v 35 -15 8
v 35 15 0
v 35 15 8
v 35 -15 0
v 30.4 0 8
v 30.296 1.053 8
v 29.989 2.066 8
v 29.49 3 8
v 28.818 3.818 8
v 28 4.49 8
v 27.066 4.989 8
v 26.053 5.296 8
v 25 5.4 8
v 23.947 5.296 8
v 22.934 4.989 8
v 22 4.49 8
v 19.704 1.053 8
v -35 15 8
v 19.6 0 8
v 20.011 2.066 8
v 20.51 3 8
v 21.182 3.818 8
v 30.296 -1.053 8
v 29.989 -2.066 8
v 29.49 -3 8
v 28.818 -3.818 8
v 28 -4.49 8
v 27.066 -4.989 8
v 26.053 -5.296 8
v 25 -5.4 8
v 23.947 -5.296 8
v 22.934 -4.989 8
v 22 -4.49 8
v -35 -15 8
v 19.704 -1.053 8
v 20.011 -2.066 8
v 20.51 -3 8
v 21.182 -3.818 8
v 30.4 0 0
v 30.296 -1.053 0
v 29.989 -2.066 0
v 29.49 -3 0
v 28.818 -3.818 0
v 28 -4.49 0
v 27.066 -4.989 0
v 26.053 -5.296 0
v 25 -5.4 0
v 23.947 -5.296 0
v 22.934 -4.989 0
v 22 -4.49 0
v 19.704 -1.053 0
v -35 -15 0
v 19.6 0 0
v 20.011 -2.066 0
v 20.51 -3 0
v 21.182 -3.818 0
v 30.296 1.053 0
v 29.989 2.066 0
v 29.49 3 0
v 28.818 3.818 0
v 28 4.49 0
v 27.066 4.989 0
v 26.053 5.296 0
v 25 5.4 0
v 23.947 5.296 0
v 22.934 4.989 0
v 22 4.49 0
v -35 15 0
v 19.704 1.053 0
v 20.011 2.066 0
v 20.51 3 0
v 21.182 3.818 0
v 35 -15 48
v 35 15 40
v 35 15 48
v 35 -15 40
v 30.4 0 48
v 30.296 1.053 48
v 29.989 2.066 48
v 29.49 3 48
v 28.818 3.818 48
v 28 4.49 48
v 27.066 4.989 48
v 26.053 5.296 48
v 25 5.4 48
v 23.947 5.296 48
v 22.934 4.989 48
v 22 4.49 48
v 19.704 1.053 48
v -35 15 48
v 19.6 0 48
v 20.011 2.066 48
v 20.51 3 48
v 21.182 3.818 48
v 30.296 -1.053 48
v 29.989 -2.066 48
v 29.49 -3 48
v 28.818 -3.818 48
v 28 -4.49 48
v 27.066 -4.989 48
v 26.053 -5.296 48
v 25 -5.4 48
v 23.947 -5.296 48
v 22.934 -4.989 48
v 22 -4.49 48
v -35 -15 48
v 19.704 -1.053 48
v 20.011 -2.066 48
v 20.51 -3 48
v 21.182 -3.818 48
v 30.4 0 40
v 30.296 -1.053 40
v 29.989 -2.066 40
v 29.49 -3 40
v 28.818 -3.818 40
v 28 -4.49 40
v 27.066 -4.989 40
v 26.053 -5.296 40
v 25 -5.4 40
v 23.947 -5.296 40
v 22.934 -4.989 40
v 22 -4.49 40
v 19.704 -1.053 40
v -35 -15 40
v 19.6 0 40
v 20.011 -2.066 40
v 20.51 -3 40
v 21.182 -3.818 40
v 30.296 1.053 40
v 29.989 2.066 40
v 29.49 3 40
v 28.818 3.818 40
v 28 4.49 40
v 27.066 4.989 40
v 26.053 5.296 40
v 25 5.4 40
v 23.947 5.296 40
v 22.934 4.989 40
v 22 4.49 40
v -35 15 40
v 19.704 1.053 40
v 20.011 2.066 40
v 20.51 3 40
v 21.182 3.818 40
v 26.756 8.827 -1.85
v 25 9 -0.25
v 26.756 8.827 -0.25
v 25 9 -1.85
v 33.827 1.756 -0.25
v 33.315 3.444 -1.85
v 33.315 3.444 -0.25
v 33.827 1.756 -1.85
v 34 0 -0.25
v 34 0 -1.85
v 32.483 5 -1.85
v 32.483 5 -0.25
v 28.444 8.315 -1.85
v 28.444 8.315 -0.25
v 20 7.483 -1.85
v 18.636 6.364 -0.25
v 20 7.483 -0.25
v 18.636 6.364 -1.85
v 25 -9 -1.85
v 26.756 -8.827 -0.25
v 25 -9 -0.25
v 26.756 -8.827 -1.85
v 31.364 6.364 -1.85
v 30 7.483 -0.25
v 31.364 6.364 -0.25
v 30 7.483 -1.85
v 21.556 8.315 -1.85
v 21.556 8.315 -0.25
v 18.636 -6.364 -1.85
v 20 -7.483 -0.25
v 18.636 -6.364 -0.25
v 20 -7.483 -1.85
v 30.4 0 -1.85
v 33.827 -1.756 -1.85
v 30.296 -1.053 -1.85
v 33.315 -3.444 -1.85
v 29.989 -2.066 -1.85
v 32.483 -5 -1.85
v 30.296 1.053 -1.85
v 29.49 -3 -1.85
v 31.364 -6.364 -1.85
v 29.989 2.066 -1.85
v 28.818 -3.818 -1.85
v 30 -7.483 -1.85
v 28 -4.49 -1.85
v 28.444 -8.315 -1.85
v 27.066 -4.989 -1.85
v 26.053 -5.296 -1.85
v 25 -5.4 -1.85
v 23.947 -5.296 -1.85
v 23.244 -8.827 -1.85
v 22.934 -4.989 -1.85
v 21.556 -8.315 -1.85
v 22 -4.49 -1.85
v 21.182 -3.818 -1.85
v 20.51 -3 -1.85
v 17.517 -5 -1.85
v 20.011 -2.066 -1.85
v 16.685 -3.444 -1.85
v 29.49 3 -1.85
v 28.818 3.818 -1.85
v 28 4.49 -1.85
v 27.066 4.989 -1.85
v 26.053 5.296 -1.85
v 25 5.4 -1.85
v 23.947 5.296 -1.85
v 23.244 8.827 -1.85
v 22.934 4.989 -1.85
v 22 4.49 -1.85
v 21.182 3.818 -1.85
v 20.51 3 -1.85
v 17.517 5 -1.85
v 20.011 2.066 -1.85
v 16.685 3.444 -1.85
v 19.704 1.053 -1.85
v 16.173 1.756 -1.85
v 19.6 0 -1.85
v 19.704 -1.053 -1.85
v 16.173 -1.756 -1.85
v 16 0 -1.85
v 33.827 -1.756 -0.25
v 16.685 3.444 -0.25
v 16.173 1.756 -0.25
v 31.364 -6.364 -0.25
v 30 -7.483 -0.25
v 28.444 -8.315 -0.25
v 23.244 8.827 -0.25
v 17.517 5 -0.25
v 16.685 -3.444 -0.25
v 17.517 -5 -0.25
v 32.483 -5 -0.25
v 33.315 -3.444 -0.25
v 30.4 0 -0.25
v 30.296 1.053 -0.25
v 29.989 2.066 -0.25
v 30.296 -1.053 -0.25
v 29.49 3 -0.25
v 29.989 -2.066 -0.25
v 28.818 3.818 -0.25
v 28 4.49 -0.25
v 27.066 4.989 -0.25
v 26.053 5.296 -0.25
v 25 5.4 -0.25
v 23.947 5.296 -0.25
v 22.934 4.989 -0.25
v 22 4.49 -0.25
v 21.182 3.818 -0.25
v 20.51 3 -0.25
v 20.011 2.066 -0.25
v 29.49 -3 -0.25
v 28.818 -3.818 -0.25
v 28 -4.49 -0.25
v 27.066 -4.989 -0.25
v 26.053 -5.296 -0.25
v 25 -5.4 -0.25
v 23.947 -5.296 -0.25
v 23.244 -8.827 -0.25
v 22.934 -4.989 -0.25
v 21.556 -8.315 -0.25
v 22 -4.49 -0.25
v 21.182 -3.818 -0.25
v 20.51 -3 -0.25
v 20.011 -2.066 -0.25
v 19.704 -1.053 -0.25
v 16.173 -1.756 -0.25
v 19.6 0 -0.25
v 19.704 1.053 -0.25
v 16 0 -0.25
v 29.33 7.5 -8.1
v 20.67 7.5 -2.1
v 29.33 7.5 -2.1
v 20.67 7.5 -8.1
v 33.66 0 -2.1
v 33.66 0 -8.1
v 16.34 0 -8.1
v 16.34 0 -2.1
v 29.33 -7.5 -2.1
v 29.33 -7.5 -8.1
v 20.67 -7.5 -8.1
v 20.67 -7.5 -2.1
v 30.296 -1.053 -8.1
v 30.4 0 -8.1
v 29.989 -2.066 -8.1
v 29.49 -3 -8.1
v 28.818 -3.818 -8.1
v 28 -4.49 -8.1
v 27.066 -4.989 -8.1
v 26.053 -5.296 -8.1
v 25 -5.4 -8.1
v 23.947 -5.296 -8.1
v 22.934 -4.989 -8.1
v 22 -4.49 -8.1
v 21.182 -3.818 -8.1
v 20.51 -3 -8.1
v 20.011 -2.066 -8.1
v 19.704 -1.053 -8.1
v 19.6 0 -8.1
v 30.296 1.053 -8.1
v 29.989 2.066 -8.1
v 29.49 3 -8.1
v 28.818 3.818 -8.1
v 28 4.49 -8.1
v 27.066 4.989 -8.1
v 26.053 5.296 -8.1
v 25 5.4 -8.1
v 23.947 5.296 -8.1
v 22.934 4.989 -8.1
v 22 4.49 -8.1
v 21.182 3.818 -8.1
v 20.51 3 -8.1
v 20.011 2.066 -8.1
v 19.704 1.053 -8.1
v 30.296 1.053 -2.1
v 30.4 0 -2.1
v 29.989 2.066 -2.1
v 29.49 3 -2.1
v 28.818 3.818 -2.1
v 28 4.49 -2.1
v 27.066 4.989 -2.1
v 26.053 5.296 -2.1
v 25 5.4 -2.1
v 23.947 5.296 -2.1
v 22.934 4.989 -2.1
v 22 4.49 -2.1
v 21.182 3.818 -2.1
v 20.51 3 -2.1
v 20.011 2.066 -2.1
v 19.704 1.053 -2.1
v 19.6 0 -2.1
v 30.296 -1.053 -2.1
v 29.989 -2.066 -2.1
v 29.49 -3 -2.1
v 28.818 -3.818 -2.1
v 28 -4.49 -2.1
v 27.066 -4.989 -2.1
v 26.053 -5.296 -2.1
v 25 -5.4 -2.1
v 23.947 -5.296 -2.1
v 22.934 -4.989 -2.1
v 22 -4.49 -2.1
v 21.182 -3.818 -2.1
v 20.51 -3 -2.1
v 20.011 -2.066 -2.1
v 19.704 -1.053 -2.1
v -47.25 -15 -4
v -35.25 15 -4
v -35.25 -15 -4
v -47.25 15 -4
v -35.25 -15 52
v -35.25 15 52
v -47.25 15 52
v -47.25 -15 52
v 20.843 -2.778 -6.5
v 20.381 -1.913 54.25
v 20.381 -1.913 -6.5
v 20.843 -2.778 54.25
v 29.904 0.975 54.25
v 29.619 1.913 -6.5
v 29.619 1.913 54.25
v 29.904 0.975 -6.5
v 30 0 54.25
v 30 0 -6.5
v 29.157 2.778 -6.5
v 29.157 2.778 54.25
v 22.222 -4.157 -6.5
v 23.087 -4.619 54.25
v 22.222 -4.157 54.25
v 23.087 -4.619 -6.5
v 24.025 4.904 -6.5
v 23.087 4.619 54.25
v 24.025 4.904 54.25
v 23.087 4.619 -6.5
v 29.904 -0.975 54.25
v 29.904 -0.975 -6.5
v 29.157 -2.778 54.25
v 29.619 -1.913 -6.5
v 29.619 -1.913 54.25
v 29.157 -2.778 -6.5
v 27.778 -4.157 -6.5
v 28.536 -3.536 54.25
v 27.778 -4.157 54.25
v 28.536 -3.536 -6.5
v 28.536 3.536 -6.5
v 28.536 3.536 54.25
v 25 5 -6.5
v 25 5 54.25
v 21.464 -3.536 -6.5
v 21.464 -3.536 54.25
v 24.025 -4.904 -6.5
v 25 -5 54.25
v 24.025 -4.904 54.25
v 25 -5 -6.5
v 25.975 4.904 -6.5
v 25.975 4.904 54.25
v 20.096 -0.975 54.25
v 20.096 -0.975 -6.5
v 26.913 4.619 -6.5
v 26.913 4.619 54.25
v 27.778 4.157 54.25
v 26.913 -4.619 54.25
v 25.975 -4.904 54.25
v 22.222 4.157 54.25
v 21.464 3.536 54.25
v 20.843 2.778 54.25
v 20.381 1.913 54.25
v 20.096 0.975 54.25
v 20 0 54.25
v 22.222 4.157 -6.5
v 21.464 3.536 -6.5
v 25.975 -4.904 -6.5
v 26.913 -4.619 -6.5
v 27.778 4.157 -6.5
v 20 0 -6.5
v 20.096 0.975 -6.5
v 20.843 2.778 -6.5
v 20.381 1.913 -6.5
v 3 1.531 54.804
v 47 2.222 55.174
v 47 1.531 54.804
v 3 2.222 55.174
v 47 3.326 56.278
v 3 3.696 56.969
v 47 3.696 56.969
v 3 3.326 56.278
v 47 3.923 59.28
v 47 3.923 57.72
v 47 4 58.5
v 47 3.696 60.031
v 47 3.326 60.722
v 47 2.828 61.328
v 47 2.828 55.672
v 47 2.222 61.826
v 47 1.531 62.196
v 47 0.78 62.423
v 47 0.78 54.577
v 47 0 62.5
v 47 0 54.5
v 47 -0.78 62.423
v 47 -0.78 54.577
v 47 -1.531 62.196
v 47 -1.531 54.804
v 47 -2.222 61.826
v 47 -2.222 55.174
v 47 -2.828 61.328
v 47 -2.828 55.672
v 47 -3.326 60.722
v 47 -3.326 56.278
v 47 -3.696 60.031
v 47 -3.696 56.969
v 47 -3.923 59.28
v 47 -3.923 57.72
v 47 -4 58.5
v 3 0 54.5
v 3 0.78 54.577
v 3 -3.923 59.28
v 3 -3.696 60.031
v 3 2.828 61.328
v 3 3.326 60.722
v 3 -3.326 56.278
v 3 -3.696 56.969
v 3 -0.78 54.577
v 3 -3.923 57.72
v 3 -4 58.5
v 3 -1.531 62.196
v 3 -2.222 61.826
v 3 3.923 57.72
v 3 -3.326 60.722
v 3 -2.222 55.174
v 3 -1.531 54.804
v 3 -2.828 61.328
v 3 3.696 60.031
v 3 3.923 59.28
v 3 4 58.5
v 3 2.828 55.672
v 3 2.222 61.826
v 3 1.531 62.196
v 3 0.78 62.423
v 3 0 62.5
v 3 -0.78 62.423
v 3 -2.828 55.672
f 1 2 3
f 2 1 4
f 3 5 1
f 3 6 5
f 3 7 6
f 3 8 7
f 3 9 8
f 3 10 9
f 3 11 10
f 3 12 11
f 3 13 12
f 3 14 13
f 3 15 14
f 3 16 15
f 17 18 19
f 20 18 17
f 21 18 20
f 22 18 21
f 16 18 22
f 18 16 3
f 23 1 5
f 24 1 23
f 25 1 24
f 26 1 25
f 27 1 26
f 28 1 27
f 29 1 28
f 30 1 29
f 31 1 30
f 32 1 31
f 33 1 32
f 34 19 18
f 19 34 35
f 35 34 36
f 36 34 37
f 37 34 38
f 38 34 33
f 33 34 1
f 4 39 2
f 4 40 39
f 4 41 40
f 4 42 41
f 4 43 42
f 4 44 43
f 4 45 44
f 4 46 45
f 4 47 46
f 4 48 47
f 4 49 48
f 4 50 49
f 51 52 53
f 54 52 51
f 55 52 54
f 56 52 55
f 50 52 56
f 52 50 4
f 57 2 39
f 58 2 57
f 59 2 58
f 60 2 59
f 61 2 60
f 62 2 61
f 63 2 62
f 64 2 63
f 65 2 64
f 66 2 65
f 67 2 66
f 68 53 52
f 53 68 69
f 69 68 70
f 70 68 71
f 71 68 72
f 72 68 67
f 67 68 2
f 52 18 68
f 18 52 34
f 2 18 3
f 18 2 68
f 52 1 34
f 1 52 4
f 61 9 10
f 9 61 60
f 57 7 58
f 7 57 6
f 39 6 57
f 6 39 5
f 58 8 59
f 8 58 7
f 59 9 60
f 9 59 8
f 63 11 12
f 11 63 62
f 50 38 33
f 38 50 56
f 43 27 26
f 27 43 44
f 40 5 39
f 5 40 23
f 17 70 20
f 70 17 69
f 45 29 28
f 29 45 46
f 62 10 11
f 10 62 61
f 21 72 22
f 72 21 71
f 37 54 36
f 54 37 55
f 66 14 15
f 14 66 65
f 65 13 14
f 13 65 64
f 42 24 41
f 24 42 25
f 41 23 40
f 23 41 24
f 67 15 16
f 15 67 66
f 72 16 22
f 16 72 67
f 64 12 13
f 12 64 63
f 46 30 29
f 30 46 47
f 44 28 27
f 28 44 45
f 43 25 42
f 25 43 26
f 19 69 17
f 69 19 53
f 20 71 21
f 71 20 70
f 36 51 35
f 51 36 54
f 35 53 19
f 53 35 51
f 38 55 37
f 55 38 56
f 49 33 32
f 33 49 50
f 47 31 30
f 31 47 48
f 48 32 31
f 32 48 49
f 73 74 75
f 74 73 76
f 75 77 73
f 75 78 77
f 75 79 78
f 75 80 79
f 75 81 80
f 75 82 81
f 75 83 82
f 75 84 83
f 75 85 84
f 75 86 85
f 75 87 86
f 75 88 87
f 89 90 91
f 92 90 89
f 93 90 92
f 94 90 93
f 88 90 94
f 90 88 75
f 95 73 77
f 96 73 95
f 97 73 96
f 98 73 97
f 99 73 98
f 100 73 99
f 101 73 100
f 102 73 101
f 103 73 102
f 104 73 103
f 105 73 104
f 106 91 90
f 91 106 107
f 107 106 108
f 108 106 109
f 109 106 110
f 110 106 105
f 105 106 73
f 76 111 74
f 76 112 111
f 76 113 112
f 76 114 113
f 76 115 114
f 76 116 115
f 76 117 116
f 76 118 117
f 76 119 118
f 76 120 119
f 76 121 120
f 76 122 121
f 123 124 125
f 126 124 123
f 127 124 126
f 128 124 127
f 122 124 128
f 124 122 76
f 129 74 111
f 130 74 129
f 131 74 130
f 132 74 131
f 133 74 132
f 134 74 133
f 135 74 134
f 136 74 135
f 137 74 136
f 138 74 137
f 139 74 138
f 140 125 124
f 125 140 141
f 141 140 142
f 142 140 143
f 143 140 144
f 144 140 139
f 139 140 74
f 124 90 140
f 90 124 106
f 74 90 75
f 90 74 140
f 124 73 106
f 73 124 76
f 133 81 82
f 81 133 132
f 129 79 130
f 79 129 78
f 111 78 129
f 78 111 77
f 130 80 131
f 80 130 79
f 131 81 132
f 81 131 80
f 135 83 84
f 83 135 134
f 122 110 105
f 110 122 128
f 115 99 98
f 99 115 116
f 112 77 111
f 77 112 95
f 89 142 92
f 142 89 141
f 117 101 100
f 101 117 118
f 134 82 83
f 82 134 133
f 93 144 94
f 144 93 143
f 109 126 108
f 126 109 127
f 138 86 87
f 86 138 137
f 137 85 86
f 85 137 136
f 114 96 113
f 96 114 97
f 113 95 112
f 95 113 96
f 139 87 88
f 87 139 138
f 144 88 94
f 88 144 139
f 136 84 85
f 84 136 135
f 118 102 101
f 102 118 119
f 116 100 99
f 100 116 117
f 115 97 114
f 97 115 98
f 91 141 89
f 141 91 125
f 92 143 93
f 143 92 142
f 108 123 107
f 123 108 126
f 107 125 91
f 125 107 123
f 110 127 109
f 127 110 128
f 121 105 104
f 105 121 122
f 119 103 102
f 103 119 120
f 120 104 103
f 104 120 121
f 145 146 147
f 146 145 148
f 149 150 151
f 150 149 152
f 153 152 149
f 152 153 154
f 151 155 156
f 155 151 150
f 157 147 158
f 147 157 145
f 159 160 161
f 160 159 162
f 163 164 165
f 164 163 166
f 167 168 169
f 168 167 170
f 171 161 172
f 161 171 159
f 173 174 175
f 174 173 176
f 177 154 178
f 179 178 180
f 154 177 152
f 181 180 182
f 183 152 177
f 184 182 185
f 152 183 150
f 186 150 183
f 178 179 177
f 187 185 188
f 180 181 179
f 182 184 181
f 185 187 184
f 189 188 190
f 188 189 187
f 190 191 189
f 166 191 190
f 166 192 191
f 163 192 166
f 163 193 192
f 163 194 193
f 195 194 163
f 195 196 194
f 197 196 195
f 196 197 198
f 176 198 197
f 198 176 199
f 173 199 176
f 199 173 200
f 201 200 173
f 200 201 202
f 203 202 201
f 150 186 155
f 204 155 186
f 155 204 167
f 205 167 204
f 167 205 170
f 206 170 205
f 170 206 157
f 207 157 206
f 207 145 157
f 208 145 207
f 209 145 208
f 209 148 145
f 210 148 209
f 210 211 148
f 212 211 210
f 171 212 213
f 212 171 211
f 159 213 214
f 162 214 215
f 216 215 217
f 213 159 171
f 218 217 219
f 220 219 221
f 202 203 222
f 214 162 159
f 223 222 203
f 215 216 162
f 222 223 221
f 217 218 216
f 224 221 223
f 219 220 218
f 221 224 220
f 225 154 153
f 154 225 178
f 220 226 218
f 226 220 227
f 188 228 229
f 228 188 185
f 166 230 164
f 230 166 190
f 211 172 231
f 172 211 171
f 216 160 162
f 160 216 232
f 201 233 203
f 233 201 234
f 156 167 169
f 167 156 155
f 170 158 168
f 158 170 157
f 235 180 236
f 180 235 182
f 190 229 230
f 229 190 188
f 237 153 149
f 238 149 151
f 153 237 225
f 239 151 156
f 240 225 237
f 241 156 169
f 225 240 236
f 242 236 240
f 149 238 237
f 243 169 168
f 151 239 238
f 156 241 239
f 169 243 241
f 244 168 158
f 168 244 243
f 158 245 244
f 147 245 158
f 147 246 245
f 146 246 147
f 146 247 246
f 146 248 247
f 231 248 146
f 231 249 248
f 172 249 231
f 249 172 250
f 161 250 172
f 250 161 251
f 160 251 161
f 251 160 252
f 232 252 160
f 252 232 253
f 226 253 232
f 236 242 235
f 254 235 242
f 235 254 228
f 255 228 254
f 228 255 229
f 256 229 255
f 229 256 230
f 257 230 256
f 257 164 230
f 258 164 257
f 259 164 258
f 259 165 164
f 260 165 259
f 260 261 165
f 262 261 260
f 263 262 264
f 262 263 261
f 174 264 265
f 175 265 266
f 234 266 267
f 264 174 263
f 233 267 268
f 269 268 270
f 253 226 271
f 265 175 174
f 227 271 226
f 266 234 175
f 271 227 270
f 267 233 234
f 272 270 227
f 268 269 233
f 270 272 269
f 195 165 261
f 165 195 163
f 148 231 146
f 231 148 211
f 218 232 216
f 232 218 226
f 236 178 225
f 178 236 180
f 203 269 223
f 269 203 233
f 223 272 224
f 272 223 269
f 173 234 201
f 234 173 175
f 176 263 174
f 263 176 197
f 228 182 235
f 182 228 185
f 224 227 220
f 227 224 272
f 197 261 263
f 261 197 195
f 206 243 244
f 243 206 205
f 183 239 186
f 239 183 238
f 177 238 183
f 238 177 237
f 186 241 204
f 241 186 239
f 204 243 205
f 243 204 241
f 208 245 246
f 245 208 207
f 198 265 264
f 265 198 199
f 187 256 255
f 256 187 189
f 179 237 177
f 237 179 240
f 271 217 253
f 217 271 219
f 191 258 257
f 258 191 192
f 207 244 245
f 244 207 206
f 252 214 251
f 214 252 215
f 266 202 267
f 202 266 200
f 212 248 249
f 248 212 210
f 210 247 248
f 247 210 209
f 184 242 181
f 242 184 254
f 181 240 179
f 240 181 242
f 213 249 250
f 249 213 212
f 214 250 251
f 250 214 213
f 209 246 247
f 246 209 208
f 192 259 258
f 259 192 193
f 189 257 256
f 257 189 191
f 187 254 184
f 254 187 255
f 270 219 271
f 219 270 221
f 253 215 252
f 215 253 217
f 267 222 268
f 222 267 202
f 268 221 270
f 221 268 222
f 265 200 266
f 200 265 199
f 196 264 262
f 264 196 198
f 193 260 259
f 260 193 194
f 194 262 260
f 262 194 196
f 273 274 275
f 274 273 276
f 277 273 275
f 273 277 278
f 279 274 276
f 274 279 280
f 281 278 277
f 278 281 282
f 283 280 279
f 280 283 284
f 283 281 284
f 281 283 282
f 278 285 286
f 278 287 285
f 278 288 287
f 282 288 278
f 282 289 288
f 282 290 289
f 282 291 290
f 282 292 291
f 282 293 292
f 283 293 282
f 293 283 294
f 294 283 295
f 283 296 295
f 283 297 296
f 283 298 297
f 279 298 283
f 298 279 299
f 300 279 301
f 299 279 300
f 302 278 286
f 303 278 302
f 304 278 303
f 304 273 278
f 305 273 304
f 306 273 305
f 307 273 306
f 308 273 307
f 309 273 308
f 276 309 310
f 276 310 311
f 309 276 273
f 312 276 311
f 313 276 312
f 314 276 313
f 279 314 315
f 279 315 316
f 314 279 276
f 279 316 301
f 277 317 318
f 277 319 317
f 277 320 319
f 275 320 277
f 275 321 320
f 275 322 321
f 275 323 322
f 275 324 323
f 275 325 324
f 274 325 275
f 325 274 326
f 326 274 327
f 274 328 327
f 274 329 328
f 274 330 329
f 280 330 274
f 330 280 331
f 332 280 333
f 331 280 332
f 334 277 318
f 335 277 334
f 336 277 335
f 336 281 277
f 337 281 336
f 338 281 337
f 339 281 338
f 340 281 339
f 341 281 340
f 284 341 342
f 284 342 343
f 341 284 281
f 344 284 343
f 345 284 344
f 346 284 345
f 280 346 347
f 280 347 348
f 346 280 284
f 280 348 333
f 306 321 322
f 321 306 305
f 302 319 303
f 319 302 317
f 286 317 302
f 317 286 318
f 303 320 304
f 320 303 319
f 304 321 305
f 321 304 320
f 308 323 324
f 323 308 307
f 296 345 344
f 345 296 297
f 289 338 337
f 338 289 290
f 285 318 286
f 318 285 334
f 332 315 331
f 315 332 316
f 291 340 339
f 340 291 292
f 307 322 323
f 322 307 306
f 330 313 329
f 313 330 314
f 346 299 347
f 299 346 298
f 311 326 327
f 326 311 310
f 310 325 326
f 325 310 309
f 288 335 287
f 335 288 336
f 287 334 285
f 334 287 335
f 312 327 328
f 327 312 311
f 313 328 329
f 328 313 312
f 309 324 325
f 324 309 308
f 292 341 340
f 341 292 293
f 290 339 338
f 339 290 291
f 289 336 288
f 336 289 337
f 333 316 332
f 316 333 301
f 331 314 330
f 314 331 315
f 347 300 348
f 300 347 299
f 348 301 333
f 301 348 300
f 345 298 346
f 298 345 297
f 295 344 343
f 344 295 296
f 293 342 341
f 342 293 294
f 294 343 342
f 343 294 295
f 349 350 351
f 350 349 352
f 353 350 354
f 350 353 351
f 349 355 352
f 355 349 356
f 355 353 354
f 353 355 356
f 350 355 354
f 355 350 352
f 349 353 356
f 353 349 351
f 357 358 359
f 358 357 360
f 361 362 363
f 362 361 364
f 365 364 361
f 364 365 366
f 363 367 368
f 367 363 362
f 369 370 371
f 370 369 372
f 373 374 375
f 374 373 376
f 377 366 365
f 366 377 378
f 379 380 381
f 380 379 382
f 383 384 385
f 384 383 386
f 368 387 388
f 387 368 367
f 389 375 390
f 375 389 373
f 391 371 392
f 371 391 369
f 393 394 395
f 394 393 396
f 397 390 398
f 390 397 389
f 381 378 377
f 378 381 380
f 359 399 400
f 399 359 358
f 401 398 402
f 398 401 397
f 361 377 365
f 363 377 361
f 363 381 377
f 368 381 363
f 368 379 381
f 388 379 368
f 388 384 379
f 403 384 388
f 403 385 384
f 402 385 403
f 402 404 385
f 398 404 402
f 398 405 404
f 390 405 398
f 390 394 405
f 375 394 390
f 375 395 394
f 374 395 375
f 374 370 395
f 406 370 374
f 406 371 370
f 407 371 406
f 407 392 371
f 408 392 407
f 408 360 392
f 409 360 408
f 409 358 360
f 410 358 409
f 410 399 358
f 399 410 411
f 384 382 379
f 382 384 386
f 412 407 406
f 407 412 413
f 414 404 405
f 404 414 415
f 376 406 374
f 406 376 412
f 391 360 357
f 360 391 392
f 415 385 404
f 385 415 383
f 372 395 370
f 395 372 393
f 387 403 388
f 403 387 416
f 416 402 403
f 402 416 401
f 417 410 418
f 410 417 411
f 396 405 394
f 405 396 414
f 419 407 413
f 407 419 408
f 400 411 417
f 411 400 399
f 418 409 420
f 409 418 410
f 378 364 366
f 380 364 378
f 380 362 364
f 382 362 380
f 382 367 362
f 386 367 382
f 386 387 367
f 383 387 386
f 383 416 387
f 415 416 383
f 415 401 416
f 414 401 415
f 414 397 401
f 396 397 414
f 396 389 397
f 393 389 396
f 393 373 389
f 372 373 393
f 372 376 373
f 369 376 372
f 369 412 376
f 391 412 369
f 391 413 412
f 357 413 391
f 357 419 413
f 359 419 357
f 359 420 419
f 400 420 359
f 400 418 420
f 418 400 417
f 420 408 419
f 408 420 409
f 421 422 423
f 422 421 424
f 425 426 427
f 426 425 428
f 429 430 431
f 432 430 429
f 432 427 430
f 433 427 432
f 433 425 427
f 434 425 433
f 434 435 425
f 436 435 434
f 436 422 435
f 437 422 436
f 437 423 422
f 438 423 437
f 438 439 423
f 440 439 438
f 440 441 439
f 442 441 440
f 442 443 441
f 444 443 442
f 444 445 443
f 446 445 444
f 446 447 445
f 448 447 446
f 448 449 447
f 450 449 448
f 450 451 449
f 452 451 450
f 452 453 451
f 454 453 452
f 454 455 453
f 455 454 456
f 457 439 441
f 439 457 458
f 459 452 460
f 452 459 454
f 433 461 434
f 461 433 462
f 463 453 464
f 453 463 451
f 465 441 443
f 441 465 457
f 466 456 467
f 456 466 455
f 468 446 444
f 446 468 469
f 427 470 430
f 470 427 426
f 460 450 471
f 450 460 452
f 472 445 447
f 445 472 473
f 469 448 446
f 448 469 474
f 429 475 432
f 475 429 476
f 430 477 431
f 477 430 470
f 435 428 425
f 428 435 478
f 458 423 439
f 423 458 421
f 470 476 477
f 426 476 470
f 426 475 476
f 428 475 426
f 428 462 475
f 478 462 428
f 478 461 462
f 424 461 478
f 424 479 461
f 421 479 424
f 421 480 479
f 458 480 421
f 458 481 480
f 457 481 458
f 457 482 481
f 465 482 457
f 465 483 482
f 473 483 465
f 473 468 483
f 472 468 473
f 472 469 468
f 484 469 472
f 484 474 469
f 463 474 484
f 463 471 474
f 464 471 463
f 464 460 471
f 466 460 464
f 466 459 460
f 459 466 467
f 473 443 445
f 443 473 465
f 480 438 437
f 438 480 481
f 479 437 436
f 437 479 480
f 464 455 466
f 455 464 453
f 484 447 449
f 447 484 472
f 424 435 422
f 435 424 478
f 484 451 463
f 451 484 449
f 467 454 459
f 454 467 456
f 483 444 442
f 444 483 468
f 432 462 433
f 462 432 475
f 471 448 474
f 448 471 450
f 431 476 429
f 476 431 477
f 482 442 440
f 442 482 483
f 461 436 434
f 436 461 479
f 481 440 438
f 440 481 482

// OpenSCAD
$fn = 32;

// ------------------------------------------------------------------------
// C clamp: throat 40 mm, screw d10
// Every part is its own module, assembly() places every instance.
// ------------------------------------------------------------------------

// --- part 1 ---
module clamp_arm() {
  difference() {
    translate([-35, -15, 0]) cube([70, 30, 8]);
    translate([25, 0, -1]) cylinder(h = 10, d = 10.8);
  }
}

// --- part 2 ---
module clamp_spine() {
  difference() {
    translate([-28, -15, 0]) cube([56, 30, 12]);
  }
}

// --- part 3 ---
module clamp_screw() {
  translate([0, 0, -30.375]) cylinder(h = 60.75, d = 10);
}

// --- part 4 ---
module clamp_washer() {
  difference() {
      translate([0, 0, 0]) cylinder(h = 1.6, d = 18);
      translate([0, 0, -1]) cylinder(h = 3.6, d = 10.8);
    }
}

// --- part 5 ---
module clamp_nut() {
  difference() {
    linear_extrude(height = 6) polygon(points = [[8.66, 0], [4.33, 7.5], [-4.33, 7.5], [-8.66, 0], [-4.33, -7.5], [4.33, -7.5]]);
    translate([0, 0, -1]) cylinder(h = 8, d = 10.8);
  }
}

// --- part 6 ---
module tommy_bar() {
  translate([0, 0, -22]) cylinder(h = 44, d = 8);
}

// --- assembly ---
module assembly() {
  color([0.80, 0.24, 0.20]) translate([0, 0, 0]) rotate([0, 0, 0]) clamp_arm();
  color([0.20, 0.45, 0.75]) translate([0, 0, 40]) rotate([0, 0, 0]) clamp_arm();
  color([0.25, 0.62, 0.32]) translate([-47.25, 0, 24]) rotate([0, 90, 0]) clamp_spine();
  color([0.92, 0.70, 0.18]) translate([25, 0, 23.875]) rotate([0, 0, 0]) clamp_screw();
  color([0.58, 0.35, 0.70]) translate([25, 0, -1.85]) rotate([0, 0, 0]) clamp_washer();
  color([0.16, 0.66, 0.66]) translate([25, 0, -8.1]) rotate([0, 0, 0]) clamp_nut();
  color([0.85, 0.48, 0.18]) translate([25, 0, 58.5]) rotate([0, 90, 0]) tommy_bar();
}

assembly();
